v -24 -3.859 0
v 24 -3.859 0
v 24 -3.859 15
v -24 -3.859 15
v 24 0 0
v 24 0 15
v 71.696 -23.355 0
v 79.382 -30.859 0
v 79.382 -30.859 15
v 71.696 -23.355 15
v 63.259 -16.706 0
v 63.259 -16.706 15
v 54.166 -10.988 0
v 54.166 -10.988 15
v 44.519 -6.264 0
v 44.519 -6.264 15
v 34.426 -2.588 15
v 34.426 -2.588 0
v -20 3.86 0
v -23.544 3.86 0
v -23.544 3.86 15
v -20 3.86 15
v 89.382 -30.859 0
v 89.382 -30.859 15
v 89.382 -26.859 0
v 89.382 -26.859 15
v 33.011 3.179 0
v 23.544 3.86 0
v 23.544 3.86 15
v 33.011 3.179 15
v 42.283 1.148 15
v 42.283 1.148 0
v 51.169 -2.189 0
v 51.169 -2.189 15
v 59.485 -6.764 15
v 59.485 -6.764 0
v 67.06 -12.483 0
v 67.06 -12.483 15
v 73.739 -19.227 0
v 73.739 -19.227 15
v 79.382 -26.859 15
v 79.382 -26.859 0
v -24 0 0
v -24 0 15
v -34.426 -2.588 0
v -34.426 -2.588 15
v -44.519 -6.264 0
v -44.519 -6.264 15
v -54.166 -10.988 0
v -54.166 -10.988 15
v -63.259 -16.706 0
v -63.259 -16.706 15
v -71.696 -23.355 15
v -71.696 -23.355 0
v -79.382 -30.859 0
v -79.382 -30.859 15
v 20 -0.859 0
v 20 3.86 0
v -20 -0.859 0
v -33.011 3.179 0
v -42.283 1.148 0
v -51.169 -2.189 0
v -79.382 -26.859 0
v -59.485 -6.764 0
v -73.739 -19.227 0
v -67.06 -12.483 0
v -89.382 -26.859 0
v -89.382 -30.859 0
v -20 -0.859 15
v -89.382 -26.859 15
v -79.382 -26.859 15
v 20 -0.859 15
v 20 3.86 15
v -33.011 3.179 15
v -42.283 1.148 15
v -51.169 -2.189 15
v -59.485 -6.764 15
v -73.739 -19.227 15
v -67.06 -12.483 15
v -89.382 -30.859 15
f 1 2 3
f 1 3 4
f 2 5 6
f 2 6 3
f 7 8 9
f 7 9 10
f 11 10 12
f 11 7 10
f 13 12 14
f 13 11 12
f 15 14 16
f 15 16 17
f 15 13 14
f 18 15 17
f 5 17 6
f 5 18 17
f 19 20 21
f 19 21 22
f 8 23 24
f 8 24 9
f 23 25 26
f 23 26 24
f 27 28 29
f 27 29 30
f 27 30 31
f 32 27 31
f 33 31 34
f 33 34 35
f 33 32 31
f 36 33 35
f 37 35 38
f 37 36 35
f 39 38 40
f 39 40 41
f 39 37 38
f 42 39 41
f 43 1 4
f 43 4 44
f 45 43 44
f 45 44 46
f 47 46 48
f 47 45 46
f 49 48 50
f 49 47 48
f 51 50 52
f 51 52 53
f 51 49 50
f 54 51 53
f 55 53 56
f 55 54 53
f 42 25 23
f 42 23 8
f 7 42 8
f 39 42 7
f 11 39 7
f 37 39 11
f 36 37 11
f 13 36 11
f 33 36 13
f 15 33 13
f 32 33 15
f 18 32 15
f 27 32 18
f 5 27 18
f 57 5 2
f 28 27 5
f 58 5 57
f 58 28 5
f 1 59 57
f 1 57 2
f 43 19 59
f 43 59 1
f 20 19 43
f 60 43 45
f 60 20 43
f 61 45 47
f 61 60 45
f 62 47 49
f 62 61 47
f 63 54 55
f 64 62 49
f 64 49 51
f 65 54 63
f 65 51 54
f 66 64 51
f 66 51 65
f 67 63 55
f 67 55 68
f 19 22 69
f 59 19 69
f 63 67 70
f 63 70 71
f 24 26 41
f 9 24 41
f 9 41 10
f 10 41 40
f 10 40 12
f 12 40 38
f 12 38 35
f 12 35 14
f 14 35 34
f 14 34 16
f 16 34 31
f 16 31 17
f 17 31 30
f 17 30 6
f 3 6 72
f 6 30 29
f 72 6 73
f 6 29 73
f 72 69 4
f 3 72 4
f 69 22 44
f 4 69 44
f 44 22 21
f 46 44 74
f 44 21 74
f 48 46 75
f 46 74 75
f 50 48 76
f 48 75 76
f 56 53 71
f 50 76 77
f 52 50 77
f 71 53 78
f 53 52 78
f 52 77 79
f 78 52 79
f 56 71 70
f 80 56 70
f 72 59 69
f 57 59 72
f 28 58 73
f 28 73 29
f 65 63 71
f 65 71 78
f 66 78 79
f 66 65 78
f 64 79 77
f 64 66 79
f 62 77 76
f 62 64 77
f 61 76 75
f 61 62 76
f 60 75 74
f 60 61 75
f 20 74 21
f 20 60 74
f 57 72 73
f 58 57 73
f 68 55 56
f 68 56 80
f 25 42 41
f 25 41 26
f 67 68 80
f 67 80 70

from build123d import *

# Parameters (mm, degrees)
EXTRUDE_2_DEPTH = 15


with BuildPart() as part:
    # 草圖1 → 填料-伸長2 (new body)
    with BuildSketch(Plane.XY):
        with BuildLine():
            Line((20, -0.85915493), (20, 3.860018002))
            Line((20, 3.860018002), (23.543805166, 3.860018002))
            ThreePointArc((23.543805166, 3.860018002), (55.409150332, -4.326684577), (79.382262386, -26.85915493))
            Line((79.382262386, -26.85915493), (89.382262386, -26.85915493))
            Line((89.382262386, -26.85915493), (89.382262386, -30.85915493))
            Line((89.382262386, -30.85915493), (79.382262386, -30.85915493))
            ThreePointArc((79.382262386, -30.85915493), (54.166103207, -10.987798363), (24, 0))
            Line((24, 0), (24, -3.85915493))
            Line((24, -3.85915493), (-24, -3.85915493))
            Line((-24, -3.85915493), (-24, 0))
            ThreePointArc((-24, 0), (-54.166103207, -10.987798363), (-79.382262386, -30.85915493))
            Line((-79.382262386, -30.85915493), (-89.382262386, -30.85915493))
            Line((-89.382262386, -30.85915493), (-89.382262386, -26.85915493))
            Line((-89.382262386, -26.85915493), (-79.382262386, -26.85915493))
            ThreePointArc((-79.382262386, -26.85915493), (-55.409150332, -4.326684577), (-23.543805166, 3.860018002))
            Line((-23.543805166, 3.860018002), (-20, 3.860018002))
            Line((-20, 3.860018002), (-20, -0.85915493))
            Line((-20, -0.85915493), (20, -0.85915493))
        make_face()
    extrude(amount=EXTRUDE_2_DEPTH)


solid = part.part
